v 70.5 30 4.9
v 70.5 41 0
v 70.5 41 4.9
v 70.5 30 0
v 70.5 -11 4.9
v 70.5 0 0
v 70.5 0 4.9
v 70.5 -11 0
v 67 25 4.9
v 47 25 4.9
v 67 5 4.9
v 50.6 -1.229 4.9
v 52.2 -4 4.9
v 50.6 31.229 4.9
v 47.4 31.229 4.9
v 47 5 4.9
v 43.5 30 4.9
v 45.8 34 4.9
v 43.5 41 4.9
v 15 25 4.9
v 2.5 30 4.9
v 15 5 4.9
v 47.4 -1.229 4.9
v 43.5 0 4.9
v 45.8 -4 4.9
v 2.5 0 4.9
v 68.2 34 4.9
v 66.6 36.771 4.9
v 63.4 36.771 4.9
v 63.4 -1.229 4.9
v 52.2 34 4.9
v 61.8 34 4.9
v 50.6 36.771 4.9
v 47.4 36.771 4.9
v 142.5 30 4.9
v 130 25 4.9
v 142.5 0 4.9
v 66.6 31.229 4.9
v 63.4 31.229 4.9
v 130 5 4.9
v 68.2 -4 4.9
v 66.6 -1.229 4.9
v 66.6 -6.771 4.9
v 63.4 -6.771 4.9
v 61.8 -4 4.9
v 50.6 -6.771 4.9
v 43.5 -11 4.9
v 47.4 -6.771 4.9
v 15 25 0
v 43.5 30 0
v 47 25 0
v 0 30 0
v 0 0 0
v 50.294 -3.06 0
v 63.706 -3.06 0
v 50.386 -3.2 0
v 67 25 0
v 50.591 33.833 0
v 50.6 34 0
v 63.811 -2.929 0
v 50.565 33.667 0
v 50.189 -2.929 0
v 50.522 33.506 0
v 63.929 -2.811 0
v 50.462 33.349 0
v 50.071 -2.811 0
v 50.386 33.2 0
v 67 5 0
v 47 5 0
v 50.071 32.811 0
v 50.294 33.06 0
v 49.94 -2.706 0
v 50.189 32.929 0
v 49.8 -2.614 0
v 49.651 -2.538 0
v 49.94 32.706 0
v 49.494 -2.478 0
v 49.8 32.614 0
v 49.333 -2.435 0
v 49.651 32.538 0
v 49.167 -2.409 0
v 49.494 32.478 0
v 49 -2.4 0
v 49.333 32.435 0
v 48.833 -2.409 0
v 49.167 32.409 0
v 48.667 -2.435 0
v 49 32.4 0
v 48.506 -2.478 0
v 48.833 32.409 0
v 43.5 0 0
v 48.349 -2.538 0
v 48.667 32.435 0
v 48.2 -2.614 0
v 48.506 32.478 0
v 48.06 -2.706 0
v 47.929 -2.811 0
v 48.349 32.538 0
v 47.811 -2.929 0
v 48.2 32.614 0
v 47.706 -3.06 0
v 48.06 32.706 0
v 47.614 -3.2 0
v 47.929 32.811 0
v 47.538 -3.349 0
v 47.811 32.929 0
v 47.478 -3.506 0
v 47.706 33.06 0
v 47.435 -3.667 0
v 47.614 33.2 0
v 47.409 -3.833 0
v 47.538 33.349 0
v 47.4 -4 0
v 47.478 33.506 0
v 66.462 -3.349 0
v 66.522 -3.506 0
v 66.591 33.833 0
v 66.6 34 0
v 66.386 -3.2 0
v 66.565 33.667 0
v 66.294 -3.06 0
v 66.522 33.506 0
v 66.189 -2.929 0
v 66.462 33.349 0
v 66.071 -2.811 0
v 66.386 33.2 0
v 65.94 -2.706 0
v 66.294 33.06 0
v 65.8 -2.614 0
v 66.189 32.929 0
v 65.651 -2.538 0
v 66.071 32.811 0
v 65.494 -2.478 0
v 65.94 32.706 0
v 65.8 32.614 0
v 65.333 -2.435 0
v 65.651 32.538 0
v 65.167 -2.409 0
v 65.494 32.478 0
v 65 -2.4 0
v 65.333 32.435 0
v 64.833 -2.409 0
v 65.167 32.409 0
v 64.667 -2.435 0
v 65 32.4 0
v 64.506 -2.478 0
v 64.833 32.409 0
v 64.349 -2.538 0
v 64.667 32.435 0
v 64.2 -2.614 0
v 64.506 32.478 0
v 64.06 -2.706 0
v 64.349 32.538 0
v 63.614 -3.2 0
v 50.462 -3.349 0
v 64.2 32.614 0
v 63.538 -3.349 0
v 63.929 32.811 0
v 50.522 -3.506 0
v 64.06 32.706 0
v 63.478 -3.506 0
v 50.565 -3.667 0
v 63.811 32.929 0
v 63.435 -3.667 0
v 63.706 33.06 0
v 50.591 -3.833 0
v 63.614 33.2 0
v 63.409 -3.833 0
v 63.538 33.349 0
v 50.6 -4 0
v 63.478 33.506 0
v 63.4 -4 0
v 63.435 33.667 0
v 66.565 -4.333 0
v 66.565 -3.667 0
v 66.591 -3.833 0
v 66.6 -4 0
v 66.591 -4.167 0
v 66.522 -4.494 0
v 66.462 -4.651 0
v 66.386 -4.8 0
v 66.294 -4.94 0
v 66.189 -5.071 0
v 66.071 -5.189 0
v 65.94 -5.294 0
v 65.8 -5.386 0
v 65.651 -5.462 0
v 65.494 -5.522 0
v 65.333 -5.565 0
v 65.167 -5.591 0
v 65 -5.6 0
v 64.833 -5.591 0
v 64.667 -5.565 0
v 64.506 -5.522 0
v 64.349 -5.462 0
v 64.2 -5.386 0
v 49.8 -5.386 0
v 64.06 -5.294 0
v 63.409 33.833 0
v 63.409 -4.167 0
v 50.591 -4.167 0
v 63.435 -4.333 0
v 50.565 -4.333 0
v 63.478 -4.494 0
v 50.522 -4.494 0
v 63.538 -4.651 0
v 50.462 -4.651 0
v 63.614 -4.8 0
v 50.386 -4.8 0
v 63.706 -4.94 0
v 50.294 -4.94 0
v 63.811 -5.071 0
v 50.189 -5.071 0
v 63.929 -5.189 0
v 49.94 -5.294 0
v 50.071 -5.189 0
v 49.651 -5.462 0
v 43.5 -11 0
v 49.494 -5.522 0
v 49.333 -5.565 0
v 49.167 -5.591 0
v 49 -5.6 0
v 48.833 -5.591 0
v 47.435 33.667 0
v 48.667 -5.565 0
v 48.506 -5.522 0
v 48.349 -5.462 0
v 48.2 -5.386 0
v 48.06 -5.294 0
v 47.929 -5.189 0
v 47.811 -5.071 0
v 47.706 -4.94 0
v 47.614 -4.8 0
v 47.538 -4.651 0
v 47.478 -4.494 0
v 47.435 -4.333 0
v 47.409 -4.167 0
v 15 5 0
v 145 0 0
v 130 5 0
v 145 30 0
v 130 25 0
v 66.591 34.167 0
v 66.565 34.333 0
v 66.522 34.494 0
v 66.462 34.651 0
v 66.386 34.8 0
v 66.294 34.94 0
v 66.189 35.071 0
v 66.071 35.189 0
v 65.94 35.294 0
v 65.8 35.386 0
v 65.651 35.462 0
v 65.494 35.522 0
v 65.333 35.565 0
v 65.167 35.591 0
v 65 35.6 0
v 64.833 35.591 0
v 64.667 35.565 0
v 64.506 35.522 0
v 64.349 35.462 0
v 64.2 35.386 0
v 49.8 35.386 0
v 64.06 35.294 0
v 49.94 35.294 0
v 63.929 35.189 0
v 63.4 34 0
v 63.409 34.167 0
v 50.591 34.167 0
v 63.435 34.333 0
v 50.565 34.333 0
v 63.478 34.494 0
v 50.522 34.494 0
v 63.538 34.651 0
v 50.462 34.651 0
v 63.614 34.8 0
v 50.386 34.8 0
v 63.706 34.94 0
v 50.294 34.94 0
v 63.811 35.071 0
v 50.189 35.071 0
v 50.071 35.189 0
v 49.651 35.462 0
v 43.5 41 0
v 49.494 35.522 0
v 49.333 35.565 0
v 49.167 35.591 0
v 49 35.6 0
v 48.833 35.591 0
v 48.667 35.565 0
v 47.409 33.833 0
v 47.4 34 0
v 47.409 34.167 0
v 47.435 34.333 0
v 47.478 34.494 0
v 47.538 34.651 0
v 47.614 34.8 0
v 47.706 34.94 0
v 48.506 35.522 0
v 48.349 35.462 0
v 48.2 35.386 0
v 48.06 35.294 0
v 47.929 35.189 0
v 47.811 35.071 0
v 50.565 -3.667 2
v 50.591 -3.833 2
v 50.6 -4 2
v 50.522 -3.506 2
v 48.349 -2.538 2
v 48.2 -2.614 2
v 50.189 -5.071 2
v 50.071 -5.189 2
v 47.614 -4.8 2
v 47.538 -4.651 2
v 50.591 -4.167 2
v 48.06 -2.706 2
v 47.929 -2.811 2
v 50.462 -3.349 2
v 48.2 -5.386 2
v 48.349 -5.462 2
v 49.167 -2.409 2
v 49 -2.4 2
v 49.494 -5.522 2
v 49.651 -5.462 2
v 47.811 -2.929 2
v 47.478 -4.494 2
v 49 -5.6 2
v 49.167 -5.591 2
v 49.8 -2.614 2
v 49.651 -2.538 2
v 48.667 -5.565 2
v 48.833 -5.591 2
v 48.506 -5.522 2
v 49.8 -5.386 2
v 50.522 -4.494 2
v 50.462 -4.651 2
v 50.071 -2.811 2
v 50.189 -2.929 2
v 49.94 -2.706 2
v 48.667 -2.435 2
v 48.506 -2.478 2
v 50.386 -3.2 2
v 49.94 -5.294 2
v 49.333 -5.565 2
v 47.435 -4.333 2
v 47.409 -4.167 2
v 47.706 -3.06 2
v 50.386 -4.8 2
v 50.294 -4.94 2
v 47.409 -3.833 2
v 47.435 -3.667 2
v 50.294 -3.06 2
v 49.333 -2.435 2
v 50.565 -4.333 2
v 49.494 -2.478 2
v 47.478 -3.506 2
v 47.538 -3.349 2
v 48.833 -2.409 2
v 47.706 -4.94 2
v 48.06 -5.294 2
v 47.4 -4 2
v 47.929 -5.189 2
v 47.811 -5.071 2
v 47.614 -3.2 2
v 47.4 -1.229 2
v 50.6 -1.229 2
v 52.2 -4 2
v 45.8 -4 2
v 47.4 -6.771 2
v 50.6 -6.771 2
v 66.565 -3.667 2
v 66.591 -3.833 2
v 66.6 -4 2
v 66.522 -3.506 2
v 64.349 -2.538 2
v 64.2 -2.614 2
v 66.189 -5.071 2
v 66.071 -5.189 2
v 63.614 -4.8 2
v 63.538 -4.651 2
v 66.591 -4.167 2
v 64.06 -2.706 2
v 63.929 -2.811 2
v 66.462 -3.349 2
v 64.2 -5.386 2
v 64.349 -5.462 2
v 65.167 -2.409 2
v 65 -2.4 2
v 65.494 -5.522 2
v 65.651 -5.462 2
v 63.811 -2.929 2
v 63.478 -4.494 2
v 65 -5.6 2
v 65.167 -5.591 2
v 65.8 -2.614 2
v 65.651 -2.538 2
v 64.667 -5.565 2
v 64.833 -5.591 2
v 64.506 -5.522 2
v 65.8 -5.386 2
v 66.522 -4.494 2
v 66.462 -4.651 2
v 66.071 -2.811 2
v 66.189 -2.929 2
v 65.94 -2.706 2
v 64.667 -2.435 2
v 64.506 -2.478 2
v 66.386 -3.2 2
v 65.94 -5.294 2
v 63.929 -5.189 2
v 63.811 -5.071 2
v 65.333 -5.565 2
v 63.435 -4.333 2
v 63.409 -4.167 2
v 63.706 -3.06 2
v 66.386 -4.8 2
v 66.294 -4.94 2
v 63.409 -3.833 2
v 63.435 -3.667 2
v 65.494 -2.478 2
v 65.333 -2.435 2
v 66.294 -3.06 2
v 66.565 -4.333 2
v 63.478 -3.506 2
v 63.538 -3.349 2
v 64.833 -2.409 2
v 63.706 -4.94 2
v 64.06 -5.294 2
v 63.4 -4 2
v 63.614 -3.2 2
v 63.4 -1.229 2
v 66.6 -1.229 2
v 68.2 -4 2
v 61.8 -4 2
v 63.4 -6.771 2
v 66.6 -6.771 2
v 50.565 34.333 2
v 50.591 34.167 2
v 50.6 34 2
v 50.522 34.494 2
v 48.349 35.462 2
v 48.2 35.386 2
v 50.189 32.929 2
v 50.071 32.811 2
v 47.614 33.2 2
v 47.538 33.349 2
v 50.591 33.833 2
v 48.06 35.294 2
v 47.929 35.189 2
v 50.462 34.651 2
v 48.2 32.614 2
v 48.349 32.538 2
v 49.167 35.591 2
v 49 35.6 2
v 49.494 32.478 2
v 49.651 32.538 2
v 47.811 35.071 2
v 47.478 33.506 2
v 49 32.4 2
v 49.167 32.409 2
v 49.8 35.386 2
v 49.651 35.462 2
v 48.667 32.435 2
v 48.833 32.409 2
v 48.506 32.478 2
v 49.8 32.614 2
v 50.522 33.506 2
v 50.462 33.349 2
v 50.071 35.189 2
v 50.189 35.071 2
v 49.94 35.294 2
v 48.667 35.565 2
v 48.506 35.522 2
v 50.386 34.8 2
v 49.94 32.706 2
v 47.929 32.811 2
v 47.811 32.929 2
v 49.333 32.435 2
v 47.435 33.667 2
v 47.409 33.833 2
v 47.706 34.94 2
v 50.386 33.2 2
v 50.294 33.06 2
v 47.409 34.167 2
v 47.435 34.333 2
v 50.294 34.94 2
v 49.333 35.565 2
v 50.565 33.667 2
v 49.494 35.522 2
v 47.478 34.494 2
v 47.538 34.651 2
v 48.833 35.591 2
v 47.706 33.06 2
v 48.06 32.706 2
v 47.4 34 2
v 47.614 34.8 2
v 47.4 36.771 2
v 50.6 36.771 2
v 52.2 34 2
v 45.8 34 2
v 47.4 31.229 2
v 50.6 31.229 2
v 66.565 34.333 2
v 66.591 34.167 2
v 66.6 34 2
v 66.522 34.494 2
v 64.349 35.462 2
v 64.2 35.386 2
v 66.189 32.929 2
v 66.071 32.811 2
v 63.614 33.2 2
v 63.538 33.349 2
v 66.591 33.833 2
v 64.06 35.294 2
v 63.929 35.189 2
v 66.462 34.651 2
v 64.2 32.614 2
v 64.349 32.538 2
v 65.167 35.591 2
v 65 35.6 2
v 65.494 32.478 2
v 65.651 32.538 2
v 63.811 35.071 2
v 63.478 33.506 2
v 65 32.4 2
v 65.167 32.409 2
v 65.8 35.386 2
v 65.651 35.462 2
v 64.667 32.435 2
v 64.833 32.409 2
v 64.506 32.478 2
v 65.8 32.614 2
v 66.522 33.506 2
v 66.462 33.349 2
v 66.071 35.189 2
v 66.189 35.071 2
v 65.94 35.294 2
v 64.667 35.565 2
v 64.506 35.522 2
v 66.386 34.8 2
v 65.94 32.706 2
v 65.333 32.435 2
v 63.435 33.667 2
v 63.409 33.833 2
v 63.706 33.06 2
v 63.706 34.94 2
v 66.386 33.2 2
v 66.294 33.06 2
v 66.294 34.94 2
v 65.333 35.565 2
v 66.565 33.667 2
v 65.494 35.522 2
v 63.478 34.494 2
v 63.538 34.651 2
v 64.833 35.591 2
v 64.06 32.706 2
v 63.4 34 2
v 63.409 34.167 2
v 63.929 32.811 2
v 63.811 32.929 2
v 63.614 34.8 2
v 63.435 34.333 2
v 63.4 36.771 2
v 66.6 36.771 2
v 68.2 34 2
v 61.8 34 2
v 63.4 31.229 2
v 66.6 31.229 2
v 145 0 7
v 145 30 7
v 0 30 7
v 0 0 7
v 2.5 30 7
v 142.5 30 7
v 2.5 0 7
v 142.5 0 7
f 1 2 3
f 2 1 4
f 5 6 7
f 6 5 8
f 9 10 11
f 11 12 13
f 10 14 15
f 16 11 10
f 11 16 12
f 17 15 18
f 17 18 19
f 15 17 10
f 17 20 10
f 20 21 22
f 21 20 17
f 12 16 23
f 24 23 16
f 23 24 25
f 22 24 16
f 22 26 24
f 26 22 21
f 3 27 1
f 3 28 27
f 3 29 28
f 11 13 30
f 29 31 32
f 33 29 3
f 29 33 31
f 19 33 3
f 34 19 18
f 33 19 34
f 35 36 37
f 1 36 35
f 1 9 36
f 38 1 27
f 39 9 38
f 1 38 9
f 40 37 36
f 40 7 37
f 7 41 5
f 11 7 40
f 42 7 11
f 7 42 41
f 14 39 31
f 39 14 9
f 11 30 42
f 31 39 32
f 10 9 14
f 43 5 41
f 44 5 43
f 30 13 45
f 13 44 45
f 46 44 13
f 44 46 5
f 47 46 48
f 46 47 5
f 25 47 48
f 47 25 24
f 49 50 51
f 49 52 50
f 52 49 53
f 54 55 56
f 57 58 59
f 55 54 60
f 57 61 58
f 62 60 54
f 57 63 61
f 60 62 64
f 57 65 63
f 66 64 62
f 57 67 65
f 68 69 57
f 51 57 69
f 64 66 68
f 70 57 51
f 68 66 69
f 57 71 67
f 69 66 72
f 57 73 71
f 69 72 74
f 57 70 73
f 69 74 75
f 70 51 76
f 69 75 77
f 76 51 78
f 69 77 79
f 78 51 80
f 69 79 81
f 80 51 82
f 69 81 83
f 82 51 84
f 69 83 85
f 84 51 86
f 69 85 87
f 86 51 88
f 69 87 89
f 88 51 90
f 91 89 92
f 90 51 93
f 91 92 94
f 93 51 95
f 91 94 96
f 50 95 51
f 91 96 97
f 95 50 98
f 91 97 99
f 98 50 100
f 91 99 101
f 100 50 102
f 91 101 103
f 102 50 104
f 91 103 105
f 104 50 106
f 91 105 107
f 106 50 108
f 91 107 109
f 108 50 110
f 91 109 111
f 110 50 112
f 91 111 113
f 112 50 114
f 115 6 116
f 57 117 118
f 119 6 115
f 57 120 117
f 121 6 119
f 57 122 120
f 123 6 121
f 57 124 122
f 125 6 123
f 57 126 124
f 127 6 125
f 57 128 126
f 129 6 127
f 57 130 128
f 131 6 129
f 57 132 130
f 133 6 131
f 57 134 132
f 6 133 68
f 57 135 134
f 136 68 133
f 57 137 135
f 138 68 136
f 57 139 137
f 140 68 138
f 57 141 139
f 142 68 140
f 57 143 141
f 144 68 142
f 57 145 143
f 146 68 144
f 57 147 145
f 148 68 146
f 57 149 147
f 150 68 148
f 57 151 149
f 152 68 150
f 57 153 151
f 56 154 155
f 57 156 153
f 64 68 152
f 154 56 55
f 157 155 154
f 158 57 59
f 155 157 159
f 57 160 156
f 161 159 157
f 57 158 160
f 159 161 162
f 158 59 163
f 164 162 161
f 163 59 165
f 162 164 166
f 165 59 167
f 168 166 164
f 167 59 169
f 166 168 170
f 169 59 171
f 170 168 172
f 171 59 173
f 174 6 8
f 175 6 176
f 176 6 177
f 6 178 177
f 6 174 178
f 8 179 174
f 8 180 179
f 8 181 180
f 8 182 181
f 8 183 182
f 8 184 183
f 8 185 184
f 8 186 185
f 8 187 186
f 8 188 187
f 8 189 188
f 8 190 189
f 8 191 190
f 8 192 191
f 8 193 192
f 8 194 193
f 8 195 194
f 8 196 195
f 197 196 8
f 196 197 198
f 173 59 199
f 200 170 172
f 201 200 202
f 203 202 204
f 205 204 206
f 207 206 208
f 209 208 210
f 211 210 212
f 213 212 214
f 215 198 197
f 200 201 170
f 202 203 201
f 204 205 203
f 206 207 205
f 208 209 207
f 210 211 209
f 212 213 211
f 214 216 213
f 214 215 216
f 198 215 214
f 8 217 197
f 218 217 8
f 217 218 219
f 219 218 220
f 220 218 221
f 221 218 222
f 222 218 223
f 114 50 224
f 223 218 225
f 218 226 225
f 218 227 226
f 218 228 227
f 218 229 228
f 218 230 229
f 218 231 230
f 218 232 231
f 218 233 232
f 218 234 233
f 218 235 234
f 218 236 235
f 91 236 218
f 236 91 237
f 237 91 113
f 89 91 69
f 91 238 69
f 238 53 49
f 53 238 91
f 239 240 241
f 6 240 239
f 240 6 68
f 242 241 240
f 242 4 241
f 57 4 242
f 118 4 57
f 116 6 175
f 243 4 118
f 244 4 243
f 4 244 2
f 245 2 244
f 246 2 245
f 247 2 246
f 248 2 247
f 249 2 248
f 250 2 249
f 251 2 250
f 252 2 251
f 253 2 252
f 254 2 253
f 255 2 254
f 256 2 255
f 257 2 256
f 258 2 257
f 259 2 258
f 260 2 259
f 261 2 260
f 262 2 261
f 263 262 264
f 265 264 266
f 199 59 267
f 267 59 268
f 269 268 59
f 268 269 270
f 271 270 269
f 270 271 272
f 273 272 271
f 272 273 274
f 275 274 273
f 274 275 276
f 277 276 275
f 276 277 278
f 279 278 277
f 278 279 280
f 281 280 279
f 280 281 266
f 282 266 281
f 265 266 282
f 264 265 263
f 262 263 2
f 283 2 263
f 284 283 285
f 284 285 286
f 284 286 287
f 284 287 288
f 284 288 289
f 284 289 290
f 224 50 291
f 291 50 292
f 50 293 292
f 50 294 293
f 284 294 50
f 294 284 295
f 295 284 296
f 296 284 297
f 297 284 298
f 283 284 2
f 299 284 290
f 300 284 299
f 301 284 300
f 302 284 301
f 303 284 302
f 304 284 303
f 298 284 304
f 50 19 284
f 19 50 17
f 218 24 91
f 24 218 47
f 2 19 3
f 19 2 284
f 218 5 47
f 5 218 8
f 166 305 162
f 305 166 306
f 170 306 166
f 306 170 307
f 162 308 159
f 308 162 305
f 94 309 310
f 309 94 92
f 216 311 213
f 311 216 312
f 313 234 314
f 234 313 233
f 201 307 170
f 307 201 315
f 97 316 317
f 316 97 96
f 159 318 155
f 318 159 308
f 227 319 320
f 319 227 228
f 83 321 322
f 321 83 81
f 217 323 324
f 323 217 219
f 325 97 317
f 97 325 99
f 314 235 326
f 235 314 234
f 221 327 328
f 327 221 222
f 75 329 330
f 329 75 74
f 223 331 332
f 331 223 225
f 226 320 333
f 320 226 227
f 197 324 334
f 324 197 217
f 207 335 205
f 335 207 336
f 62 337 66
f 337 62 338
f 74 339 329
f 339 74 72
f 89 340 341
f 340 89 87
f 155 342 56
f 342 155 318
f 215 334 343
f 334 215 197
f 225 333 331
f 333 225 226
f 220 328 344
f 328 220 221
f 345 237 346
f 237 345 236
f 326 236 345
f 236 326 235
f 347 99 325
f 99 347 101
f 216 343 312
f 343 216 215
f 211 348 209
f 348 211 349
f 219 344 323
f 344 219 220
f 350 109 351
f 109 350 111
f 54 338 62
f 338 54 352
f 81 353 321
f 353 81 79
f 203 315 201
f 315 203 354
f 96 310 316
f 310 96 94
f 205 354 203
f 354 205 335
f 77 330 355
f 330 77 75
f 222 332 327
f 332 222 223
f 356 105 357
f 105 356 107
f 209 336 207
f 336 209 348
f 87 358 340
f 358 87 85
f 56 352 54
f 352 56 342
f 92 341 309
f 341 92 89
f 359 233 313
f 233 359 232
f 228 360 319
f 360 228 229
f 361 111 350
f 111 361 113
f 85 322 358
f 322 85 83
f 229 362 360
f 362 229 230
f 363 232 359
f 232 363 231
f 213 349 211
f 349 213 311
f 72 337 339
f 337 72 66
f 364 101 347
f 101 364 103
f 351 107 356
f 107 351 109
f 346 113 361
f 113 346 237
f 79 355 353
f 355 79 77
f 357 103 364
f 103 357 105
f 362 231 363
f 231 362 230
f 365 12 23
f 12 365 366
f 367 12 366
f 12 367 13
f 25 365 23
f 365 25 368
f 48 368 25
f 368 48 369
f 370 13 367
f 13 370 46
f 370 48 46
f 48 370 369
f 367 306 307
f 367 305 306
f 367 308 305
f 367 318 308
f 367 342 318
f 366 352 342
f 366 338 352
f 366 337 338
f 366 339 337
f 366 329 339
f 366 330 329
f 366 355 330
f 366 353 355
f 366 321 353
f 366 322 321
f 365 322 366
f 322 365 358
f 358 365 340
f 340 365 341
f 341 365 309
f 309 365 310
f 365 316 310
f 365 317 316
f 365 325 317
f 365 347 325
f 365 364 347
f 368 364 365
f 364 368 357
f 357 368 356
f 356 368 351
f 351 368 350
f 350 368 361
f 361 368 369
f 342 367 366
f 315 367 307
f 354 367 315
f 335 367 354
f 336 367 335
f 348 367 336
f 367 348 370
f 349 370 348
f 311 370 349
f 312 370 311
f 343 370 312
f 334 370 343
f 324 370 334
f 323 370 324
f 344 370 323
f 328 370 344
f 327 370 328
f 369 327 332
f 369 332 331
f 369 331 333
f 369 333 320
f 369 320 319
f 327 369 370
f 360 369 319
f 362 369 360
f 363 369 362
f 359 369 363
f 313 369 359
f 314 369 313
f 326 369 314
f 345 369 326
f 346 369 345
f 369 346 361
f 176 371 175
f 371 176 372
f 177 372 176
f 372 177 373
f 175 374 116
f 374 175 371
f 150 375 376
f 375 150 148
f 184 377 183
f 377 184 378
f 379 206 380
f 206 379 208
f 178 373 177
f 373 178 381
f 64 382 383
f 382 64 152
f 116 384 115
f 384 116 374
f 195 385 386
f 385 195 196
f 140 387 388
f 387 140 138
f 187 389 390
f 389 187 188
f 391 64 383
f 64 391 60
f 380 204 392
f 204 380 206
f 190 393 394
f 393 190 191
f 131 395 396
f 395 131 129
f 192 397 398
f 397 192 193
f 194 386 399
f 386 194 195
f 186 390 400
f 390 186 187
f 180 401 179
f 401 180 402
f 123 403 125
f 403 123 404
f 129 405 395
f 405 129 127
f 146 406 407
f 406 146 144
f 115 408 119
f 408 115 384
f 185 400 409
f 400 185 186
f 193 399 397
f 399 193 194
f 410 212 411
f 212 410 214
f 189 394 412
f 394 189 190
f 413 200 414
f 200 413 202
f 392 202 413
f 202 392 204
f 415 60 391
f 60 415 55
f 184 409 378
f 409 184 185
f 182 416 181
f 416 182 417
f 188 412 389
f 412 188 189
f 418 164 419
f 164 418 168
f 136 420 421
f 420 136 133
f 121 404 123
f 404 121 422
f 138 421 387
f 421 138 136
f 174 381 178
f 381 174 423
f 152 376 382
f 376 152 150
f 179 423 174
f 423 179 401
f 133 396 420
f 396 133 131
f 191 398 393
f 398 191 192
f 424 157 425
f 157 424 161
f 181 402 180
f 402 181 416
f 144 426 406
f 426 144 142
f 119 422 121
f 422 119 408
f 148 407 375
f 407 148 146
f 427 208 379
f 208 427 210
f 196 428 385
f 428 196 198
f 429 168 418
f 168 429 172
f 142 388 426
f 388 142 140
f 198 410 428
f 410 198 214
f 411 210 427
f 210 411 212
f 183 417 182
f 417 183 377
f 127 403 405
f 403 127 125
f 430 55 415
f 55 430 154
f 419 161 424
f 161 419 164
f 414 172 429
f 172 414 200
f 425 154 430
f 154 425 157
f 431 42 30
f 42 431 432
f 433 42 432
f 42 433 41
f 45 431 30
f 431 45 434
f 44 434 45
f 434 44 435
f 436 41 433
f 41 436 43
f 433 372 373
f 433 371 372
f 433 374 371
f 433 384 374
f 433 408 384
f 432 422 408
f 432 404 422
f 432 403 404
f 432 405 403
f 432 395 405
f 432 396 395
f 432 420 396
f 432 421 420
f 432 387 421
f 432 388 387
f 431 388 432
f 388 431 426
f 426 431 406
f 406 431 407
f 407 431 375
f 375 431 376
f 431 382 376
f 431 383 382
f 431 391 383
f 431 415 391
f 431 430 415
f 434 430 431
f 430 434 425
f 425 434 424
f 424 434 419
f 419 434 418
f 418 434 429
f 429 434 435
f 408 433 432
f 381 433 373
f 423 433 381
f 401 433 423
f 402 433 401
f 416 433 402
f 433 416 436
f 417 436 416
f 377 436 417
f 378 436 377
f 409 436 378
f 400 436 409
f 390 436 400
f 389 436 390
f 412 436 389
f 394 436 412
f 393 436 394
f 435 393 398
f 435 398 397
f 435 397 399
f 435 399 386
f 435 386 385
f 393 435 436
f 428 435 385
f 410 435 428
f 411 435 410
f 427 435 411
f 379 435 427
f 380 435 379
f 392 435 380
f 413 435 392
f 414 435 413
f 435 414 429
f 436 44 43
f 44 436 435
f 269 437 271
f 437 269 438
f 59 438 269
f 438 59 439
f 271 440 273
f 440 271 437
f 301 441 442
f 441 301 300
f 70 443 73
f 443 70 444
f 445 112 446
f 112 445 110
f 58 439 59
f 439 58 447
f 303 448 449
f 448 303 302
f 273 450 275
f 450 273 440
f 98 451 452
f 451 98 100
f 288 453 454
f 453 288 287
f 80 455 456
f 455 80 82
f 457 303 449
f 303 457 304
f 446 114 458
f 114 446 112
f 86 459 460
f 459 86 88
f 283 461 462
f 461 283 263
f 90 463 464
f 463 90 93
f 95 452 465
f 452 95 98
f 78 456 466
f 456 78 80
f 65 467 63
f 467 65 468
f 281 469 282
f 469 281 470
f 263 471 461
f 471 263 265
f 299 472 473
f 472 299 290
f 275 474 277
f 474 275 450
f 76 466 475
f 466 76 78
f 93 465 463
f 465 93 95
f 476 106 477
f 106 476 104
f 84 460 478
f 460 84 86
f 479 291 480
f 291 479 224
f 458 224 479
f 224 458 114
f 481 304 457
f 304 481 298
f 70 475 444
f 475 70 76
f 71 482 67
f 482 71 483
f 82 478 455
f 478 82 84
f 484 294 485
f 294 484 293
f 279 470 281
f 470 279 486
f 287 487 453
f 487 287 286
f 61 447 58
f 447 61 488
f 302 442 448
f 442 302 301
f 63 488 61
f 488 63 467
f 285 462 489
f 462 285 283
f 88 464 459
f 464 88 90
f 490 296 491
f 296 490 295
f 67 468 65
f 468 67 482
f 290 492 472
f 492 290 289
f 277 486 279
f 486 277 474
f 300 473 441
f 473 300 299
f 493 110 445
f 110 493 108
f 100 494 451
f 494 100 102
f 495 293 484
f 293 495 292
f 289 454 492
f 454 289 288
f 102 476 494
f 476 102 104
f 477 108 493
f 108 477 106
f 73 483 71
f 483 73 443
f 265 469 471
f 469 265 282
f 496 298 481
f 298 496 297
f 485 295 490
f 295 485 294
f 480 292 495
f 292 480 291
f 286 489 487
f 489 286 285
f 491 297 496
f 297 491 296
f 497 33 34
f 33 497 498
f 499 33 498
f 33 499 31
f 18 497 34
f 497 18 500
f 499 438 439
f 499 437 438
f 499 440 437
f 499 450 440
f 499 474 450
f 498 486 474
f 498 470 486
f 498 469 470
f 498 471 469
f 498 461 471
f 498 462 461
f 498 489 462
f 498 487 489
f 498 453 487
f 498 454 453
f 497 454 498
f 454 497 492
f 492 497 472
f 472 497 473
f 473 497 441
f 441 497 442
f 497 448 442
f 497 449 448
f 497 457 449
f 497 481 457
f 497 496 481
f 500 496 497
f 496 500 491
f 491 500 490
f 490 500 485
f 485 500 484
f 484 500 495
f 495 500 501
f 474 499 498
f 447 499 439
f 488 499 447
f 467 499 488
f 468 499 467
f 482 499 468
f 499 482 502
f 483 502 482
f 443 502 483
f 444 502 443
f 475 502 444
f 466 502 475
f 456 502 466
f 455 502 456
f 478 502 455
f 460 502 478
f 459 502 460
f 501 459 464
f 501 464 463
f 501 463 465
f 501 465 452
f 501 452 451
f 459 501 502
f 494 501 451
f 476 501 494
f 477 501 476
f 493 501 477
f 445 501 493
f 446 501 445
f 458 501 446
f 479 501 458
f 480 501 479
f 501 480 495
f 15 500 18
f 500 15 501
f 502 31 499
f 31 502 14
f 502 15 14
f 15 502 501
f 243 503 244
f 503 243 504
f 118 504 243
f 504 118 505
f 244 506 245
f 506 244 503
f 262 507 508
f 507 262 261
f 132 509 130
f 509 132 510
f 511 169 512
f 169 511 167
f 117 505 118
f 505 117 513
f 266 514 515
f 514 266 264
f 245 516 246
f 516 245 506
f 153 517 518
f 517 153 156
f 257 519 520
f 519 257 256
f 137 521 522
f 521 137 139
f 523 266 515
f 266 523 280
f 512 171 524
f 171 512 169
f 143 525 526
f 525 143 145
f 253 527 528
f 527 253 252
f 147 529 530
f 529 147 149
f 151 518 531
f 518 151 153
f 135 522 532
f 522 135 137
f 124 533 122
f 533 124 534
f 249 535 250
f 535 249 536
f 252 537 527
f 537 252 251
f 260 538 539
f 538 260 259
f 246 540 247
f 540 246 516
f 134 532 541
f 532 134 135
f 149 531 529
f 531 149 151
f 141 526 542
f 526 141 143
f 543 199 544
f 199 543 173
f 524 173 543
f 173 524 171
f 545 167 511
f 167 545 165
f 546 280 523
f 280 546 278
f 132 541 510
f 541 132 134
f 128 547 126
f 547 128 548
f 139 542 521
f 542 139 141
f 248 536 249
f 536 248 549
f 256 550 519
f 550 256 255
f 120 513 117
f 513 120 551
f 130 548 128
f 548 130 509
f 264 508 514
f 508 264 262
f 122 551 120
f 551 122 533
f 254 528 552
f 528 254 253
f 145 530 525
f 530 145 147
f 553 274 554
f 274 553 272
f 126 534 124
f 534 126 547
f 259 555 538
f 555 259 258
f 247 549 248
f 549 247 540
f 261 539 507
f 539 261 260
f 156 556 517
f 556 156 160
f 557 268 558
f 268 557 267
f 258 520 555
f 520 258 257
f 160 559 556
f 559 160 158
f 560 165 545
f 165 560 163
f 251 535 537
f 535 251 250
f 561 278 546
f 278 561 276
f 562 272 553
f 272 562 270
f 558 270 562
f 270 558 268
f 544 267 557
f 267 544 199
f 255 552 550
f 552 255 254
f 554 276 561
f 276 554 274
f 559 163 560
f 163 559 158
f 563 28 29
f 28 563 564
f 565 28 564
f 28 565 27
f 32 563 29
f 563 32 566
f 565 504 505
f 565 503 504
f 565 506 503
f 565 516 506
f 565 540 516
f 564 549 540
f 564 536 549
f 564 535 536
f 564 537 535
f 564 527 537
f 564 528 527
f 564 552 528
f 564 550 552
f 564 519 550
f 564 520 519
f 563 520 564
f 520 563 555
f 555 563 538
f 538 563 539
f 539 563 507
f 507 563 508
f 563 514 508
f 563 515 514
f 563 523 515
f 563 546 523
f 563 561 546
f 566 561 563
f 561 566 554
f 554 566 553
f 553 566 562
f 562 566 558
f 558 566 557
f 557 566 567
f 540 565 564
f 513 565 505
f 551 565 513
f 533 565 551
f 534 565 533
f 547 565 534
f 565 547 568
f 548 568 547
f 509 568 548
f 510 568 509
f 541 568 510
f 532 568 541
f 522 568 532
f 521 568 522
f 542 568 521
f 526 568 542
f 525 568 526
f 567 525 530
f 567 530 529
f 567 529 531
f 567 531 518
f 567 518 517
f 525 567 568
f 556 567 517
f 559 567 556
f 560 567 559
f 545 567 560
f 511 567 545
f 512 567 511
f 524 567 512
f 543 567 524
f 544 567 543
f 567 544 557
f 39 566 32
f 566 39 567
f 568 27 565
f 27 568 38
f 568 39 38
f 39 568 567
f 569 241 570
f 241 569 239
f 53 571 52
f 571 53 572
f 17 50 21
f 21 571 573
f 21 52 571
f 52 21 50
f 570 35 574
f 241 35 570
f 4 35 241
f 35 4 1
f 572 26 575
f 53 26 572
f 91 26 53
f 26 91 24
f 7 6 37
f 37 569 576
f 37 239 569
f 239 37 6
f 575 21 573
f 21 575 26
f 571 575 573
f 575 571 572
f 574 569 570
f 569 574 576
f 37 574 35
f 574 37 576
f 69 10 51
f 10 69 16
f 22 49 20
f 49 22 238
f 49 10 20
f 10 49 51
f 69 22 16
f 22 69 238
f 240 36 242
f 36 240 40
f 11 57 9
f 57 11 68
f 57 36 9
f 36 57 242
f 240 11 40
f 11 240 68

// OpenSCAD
module y_bearing_holder(){

	difference(){
		union(){			
			translate([0,0,-2])hull(){
				translate([0,0,-7.7])cube([13.5,16.5,5]);
				translate([12.15,22.25,-7.7])cylinder(h=5,r=5,$fn=60);
			}
			
			translate([0,0,-2])hull(){
				translate([54.8,0,-7.7])cube([13.5,16.5,5]);
				translate([56.15,22.25,-7.7])cylinder(h=5,r=5,$fn=60);
			}
			
			color("cyan")translate([0,-1.50,-7]){
				translate([0,-1,-2.7])cube([68.3,18.5,5]);
			}
			//color("orange")translate([13,-40,-9.7])cube([42,45,5]);
			// donde agarran los rodamientos LM6UU
			//translate([0,-2.5,-4.7])cube([13.5,18.5,9]);
			//translate([54.8,-2.5,-4.7])cube([13.5,18.5,9]);
			color("orange")translate([3.3,-2.5,-4.7])cube([15,18.5,4.75]);
			color("orange")translate([49.8,-2.5,-4.7])cube([15,18.5,4.75]);
		}

		translate([78.3,15.25,0])union(){
			// tornillos y tuercas de fijacion a la bandeja
			translate([-66.15,7,-10])cylinder(h=15,r=1.65,$fn=30);
			translate([-66.15,7,-7.5])cylinder(h=5,r=3.15,$fn=6);
			translate([-22.15,7,-10])cylinder(h=15,r=1.65,$fn=30);
			translate([-22.15,7,-7.5])cylinder(h=5,r=3.15,$fn=6);
			// rodamientos y barra lisa
			//translate([5,-8.5,0])rotate([0,-90,0])
			//	cylinder(h=100,r=6.1,$fn=60);
			translate([-58,-8.5,-1])rotate([0,-90,0])
				cylinder(h=19,r=6.1,$fn=60);
			#translate([-11.5,-8.5,-1])rotate([0,-90,0])
				cylinder(h=19,r=6.1,$fn=60);
			translate([-100,-2.25,-2.95])difference(){
				cube([100,4,4]);	
				color("pink")translate([-2,0,0])rotate([0,90,0])
					cylinder(h=105, r=3, $fn=50);
			}
			translate([0,-14.7,-2.95])rotate([0,0,180])difference(){
				cube([100,4,4]);	
				color("pink")translate([-2,0,0])rotate([0,90,0])
					cylinder(h=105, r=3, $fn=50);
			}
			// huecos rectangulares redondeados
			translate([-49.3,-65,0])hull(){
				translate([0,0,-15])cylinder(h=20,r=5,$fn=50);
				translate([10,0,-15])cylinder(h=20,r=5,$fn=50);
				translate([0,20,-15])cylinder(h=20,r=5,$fn=50);
				translate([10,20,-15])cylinder(h=20,r=5,$fn=50);
	
			}
			translate([-49.3,-25,0])hull(){
				translate([0,0,-15])cylinder(h=20,r=5,$fn=50);
				translate([10,0,-15])cylinder(h=20,r=5,$fn=50);
				translate([0,10,-15])cylinder(h=20,r=5,$fn=50);
				translate([10,10,-15])cylinder(h=20,r=5,$fn=50);
	
			}
		}
	}
}

module belt_holder(altura){
	difference(){
		color("red")rotate([0,0,180])hull(){
			translate([0,0,-10])cylinder(h=altura,r=5,$fn=50);
			translate([0,21,-10])cylinder(h=altura,r=5,$fn=50);
		}
		translate([0,-2.7,-10.5])union(){
			cylinder(h=altura+5,r=1.65,$fn=30);
			translate([-8,-3.3,altura-5])cube([16,6,3]);
		}
		translate([0,-18.7,-10.5])union(){
			cylinder(h=altura+5,r=1.65,$fn=30);
			translate([-8,-3.3,altura-5])cube([16,6,3]);
		}
	}
}



module belt_clip(altura,pitch = 2.5){
	difference(){
		color("orange")rotate([0,0,180])hull(){
			translate([0,0,0])cylinder(h=altura,r=5,$fn=50);
			translate([0,21,0])cylinder(h=altura,r=5,$fn=50);
		}
		// agujero para los tornillos fijadores
		translate([0,-2.7,-2])cylinder(h=altura+5,r=1.65,$fn=30);
		translate([0,-18.7,-2])cylinder(h=altura+5,r=1.65,$fn=30);
		// hueco para la correa
		translate([-8,-13.5,altura-0.5])cube([16,6,2.5]);
		for (i=[0:5]) {
	    	translate([-5+pitch*i, -13.5, altura-1.5]) cube([1.6, 6, 1.5]);  
		}
	}
}


module y_carriage(){

	difference(){
		union(){
			cube([145,30,4.9]);
			translate([0,0,4.9])cube([2.5,30,2.1]);
			translate([142.5,0,4.9])cube([2.5,30,2.1]);
		
			translate([43.5,-11,0])difference(){
				cube([27,52,4.9]);
		
				translate([5.5,7,-2])cylinder(h=10, r=1.6, $fn=60);
				translate([5.5,7,2])cylinder(h=10, r=3.2, $fn=6);
				translate([21.5,7,-2])cylinder(h=10, r=1.6, $fn=60);	
				translate([21.5,7,2])cylinder(h=10, r=3.2, $fn=6);
				translate([5.5,45,-2])cylinder(h=10, r=1.6, $fn=60);	
				translate([5.5,45,2])cylinder(h=10, r=3.2, $fn=6);
				translate([21.5,45,-2])cylinder(h=10, r=1.6, $fn=60);	
				translate([21.5,45,2])cylinder(h=10, r=3.2, $fn=6);
			}
		}

		translate([15,5,-2])cube([32,20,15]);
		translate([67,5,-2])cube([63,20,15]);
	}
}


// -----------------------------------------

/*
translate([0,0,10]){
y_bearing_holder();
//translate([18.5,-11,5.3])belt_holder(13);
//translate([49.5,-11,5.3])belt_holder(13);
//mirror([0,1,0])translate([0,75.5,0])y_bearing_holder();
mirror([0,1,0])translate([0,10,0])y_bearing_holder();
}
//translate([-5,-16,0])belt_clip(altura = 5);
//translate([-20,-16,0])belt_clip(altura = 5);
*/


y_carriage();
